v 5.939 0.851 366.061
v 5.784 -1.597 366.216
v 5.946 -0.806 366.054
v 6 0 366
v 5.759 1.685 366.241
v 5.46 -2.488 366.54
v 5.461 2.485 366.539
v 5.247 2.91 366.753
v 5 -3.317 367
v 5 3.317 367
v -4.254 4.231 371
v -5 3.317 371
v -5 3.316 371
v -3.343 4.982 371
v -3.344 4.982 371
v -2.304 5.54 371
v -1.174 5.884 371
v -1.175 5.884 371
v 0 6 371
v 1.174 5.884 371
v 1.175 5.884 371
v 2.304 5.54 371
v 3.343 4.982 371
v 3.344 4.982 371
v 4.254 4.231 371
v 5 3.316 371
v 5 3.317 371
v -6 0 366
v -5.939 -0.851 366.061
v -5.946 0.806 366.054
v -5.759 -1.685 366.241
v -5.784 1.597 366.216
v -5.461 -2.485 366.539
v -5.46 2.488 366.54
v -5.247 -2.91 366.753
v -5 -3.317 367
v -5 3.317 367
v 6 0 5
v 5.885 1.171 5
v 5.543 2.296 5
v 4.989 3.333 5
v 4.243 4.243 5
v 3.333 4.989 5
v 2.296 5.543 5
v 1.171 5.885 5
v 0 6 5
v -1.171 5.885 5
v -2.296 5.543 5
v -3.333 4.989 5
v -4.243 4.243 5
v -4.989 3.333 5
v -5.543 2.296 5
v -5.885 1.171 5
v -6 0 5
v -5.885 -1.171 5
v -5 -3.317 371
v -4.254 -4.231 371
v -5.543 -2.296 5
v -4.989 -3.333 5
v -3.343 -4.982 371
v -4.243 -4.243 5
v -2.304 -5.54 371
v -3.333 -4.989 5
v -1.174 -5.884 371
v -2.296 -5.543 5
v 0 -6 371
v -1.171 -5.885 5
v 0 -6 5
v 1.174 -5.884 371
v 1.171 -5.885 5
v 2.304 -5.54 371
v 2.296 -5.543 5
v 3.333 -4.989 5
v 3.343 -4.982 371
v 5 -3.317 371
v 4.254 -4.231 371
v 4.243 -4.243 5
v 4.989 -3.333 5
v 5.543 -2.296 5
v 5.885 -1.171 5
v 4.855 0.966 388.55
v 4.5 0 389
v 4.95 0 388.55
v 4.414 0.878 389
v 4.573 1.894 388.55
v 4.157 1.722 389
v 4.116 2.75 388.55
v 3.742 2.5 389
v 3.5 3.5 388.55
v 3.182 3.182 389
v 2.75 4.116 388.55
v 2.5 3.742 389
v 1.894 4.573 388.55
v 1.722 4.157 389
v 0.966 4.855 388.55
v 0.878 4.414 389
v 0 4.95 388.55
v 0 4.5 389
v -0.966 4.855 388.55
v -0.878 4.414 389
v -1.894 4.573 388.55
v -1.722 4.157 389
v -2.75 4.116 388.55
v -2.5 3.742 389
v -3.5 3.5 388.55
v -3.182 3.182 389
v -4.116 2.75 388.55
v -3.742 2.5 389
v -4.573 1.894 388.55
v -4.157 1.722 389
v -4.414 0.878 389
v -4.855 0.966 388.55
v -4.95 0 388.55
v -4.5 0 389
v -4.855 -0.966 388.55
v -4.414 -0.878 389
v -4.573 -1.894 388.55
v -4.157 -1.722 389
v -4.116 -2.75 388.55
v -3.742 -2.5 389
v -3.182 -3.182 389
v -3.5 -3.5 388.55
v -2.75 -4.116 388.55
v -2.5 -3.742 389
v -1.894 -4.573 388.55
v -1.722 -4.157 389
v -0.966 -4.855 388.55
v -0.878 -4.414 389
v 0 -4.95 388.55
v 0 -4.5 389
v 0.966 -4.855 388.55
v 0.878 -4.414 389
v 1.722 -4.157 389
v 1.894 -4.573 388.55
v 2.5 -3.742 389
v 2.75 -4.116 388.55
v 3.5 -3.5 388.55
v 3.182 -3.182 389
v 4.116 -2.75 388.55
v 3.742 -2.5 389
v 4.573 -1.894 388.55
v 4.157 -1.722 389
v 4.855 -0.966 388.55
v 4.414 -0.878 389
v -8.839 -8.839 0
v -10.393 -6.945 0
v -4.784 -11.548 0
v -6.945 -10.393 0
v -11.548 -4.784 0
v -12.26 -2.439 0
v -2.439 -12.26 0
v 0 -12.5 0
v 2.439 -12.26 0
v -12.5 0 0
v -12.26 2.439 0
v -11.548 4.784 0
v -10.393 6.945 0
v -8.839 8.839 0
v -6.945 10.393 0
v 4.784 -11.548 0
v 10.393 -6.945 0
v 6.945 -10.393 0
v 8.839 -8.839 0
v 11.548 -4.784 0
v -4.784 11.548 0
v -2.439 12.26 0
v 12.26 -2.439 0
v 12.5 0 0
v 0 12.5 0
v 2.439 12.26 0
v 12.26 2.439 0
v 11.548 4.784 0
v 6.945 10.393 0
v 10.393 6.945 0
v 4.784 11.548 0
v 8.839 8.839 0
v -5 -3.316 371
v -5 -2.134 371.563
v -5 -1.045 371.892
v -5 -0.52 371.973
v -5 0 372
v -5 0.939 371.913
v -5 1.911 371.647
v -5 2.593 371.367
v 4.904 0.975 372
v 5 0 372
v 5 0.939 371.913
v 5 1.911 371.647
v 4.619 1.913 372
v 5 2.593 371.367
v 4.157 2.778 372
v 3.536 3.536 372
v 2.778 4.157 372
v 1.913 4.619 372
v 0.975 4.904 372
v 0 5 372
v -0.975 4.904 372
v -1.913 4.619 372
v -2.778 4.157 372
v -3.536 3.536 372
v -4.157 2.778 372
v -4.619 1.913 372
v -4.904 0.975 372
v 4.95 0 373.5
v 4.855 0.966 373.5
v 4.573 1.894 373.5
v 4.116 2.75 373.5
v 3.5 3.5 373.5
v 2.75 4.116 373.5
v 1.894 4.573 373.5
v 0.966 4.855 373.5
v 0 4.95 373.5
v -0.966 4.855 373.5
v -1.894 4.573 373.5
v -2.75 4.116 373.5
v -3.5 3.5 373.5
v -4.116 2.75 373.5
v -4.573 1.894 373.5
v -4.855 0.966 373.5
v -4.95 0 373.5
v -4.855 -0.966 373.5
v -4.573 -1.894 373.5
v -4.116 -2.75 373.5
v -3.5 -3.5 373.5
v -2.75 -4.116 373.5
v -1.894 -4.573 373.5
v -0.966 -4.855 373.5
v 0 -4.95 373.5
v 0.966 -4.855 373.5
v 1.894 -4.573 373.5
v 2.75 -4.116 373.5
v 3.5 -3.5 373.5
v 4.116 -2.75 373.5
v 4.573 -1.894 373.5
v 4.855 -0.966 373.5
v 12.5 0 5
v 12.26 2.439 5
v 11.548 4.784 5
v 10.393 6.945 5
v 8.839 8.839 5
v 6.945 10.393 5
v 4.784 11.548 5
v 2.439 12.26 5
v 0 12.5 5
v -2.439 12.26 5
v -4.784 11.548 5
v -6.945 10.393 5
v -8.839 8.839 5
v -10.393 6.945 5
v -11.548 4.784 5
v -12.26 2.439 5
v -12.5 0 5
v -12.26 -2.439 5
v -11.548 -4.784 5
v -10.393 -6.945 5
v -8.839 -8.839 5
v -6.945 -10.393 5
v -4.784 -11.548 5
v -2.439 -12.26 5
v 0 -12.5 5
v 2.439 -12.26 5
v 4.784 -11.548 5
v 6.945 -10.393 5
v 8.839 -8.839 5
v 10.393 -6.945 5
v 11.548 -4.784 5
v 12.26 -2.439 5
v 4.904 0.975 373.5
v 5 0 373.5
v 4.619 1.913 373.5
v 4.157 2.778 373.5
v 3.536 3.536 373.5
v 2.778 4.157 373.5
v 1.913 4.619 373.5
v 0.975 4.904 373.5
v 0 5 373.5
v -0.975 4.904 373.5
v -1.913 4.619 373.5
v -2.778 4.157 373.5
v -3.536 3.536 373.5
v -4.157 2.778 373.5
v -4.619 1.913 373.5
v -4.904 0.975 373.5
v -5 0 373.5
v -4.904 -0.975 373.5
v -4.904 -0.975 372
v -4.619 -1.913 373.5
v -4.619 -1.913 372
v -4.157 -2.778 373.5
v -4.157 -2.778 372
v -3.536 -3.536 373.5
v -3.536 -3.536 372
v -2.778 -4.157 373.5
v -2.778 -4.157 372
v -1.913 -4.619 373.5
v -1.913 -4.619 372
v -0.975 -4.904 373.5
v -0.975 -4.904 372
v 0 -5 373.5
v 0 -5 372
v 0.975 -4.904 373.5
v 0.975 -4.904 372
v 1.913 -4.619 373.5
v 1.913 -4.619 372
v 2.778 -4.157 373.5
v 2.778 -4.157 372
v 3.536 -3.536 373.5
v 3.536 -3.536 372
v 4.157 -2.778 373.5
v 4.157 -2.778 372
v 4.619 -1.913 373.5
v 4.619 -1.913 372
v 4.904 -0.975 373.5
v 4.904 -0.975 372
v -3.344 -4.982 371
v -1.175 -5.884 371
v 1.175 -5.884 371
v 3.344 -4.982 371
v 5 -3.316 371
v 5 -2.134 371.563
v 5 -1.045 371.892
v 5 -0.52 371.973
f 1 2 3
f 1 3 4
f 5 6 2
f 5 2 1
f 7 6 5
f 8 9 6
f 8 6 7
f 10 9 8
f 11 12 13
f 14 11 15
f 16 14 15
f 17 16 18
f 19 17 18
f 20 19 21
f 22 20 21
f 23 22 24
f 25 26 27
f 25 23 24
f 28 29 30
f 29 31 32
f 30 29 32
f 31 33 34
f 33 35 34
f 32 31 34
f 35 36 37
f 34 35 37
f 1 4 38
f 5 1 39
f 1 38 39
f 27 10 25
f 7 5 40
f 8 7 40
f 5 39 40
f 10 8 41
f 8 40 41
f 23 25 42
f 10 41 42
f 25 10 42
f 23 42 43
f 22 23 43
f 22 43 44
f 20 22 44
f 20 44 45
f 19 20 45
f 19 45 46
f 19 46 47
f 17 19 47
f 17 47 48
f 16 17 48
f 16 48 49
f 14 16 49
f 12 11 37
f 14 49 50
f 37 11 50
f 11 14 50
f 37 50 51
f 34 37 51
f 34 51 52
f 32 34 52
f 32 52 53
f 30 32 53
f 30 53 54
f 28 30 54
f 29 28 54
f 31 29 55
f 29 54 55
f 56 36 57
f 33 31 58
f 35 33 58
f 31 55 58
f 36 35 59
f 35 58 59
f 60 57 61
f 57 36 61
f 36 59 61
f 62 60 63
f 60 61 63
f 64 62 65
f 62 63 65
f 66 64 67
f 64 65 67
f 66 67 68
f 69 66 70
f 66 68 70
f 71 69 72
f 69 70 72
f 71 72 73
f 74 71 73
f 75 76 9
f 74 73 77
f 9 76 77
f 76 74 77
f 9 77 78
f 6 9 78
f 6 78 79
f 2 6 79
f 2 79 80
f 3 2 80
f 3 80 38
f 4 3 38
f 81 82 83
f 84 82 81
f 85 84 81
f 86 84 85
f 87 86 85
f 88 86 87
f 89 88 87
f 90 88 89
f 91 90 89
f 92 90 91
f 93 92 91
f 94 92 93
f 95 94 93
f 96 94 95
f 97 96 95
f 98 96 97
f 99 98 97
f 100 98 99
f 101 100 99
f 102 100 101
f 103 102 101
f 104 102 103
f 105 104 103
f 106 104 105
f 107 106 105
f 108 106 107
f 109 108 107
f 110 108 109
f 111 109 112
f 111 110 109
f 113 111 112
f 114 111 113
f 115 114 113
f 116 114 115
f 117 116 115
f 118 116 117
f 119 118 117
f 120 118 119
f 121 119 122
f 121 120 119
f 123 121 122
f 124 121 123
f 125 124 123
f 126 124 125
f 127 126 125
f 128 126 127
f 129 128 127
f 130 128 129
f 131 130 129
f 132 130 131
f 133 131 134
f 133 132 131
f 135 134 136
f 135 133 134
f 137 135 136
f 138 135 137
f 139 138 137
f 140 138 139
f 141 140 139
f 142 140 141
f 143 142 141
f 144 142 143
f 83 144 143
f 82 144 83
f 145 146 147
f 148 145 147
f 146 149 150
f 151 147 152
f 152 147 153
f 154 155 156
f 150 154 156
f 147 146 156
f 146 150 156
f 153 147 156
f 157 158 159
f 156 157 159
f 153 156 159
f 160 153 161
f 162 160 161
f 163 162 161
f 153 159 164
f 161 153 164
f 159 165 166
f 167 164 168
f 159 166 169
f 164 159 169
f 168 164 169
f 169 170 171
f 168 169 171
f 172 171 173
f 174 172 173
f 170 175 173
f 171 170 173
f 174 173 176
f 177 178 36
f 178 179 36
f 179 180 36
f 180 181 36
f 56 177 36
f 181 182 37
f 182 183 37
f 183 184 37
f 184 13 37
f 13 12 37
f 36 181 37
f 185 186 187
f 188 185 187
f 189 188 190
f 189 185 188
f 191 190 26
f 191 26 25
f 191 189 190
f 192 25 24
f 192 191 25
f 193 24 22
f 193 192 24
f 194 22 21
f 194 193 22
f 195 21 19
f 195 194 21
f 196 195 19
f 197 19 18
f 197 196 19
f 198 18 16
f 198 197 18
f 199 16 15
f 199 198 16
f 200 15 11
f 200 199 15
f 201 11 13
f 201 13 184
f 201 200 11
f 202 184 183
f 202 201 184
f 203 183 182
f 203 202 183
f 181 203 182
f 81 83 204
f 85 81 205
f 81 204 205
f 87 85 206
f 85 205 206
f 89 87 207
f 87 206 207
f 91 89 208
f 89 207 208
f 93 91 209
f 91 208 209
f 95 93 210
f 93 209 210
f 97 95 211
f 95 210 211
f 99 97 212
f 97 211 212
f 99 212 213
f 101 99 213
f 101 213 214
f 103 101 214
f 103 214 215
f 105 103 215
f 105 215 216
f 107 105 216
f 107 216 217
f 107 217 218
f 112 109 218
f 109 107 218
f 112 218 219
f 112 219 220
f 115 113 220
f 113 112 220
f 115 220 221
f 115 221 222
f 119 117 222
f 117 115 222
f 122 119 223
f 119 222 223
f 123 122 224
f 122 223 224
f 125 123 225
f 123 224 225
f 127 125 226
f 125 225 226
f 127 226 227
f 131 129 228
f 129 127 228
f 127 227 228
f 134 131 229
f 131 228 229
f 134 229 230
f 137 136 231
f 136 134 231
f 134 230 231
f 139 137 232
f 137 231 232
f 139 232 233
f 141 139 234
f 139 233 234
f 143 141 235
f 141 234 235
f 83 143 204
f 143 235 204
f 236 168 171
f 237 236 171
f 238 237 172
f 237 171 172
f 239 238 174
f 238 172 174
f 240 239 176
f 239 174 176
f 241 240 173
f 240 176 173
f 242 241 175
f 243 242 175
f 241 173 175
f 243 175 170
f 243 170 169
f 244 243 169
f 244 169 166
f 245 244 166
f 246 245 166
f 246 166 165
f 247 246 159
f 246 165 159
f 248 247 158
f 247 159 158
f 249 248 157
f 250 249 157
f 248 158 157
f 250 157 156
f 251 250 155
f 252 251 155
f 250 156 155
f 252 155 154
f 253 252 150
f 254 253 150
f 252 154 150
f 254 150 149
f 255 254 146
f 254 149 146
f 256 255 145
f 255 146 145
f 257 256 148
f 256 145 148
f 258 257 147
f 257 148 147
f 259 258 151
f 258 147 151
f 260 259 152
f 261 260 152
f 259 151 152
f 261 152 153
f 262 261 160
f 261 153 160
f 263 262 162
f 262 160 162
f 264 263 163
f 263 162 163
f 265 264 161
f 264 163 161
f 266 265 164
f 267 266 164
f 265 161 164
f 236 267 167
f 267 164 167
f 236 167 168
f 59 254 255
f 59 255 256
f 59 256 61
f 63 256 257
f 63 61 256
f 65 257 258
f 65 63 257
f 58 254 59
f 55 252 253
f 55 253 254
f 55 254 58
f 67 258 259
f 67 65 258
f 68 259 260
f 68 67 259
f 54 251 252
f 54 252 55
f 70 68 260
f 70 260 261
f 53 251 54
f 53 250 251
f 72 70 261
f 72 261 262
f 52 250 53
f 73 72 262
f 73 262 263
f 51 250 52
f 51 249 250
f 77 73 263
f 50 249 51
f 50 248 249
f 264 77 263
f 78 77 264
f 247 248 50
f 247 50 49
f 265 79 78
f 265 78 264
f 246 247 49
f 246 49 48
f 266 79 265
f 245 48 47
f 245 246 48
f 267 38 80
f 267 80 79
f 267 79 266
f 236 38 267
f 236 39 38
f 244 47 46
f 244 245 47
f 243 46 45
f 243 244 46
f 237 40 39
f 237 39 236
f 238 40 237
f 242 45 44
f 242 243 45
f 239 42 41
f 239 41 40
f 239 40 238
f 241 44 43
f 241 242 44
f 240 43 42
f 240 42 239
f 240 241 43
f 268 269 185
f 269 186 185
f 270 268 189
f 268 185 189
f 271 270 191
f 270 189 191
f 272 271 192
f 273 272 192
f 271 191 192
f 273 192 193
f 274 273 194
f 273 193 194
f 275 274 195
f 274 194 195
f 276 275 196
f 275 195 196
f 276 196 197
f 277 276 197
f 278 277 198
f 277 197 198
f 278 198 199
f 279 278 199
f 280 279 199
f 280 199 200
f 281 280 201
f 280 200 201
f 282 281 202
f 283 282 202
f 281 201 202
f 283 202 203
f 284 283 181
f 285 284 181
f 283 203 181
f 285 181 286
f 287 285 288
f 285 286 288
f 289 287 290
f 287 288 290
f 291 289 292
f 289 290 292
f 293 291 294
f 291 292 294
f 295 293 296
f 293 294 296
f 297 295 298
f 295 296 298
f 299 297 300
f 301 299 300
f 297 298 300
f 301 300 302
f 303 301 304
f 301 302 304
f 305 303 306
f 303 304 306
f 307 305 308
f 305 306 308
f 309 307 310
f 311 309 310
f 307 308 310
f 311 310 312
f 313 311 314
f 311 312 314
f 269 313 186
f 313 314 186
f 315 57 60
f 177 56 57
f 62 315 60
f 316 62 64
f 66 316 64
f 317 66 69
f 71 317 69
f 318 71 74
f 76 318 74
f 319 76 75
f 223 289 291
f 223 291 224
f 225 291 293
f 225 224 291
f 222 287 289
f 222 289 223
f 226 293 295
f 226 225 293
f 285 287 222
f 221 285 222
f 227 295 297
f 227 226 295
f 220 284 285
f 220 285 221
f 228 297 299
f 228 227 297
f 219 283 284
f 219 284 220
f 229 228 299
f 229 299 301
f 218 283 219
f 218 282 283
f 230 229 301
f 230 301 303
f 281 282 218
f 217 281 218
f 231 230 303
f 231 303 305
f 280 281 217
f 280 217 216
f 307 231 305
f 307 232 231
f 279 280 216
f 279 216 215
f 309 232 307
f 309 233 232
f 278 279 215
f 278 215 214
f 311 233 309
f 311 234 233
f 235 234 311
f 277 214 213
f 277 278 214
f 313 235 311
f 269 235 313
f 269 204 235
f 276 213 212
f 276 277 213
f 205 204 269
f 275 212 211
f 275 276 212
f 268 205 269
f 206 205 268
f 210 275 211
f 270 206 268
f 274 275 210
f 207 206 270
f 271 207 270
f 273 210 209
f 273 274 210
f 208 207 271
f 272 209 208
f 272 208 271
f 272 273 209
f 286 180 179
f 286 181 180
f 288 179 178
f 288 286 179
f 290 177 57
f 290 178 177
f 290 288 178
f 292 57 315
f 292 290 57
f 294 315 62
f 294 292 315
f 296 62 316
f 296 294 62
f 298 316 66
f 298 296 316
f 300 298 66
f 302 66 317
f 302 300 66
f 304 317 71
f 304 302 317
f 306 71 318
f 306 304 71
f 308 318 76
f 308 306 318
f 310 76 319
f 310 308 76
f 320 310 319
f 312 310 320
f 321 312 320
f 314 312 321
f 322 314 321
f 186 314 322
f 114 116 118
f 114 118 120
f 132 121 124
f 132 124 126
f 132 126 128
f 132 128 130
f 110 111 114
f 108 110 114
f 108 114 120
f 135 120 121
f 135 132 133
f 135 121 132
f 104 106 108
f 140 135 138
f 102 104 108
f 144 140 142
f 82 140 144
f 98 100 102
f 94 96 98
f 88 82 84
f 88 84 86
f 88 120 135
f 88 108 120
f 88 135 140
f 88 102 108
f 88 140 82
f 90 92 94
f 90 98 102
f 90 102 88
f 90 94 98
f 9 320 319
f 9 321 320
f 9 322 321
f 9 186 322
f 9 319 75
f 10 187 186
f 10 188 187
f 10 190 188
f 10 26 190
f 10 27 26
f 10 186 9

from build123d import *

# Parameters (mm, degrees)
SKETCH1_R           = 12.5
PISTON_DEPTH        = 5
SKETCH2_R           = 6
ROD_DEPTH           = 389
THREADS_START       = -18
SKETCH3_R           = 6
SKETCH3_R_2         = 5
THREADS_DEPTH       = 18
ROD_CHAMFER_SIZE    = 1
WRENCH_FLAT_DEPTH   = 390.401463788
THREAD_CHAMFER_SIZE = 0.5
CUT_EXTRUDE1_START  = -15.5
SKETCH5_R           = 5
SKETCH5_R_2         = 4.95
CUT_EXTRUDE1_DEPTH  = 15.5


with BuildPart() as part:
    # Sketch1 → Piston (new body)
    with BuildSketch(Plane.XY):
        Circle(SKETCH1_R)
    extrude(amount=PISTON_DEPTH)

    # Sketch2 → Rod (add)
    with BuildSketch(Plane.XY):
        Circle(SKETCH2_R)
    extrude(amount=ROD_DEPTH)

    # Sketch3 → Threads (cut)
    with BuildSketch(Plane.XY.offset(389).offset(THREADS_START)):
        Circle(SKETCH3_R)
        Circle(SKETCH3_R_2, mode=Mode.SUBTRACT)
    extrude(amount=THREADS_DEPTH, mode=Mode.SUBTRACT)

    # Rod Chamfer
    rod_chamfer_edges = [part.edges().sort_by_distance(p)[0] for p in [
        (-5, 0, 371),
    ]]
    chamfer(rod_chamfer_edges, length=ROD_CHAMFER_SIZE - 0.0001)  # a hair under: the kernel refuses the full size

    # Sketch4 → Wrench Flat (cut, symmetric)
    with BuildSketch(Plane(origin=(0, 0, 0), x_dir=(1, 0, 0), z_dir=(0, 1, 0))):
        Polygon((5, -372), (5, -367), (6, -366), (6, -372), align=None)
    wrench_flat = extrude(amount=WRENCH_FLAT_DEPTH, both=True, mode=Mode.SUBTRACT)

    # Mirror1: Wrench Flat across plane
    add(wrench_flat.mirror(Plane(origin=(0, 0, 0), x_dir=(0, 0, 1), z_dir=(1, 0, 0))), mode=Mode.SUBTRACT)

    # Thread Chamfer
    thread_chamfer_edges = [part.edges().sort_by_distance(p)[0] for p in [
        (-5, 0, 389),
    ]]
    chamfer(thread_chamfer_edges, length=THREAD_CHAMFER_SIZE)

    # Sketch5 → Cut-Extrude1 (cut)
    with BuildSketch(Plane.XY.offset(389).offset(CUT_EXTRUDE1_START)):
        Circle(SKETCH5_R)
        Circle(SKETCH5_R_2, mode=Mode.SUBTRACT)
    extrude(amount=CUT_EXTRUDE1_DEPTH, mode=Mode.SUBTRACT)


solid = part.part
